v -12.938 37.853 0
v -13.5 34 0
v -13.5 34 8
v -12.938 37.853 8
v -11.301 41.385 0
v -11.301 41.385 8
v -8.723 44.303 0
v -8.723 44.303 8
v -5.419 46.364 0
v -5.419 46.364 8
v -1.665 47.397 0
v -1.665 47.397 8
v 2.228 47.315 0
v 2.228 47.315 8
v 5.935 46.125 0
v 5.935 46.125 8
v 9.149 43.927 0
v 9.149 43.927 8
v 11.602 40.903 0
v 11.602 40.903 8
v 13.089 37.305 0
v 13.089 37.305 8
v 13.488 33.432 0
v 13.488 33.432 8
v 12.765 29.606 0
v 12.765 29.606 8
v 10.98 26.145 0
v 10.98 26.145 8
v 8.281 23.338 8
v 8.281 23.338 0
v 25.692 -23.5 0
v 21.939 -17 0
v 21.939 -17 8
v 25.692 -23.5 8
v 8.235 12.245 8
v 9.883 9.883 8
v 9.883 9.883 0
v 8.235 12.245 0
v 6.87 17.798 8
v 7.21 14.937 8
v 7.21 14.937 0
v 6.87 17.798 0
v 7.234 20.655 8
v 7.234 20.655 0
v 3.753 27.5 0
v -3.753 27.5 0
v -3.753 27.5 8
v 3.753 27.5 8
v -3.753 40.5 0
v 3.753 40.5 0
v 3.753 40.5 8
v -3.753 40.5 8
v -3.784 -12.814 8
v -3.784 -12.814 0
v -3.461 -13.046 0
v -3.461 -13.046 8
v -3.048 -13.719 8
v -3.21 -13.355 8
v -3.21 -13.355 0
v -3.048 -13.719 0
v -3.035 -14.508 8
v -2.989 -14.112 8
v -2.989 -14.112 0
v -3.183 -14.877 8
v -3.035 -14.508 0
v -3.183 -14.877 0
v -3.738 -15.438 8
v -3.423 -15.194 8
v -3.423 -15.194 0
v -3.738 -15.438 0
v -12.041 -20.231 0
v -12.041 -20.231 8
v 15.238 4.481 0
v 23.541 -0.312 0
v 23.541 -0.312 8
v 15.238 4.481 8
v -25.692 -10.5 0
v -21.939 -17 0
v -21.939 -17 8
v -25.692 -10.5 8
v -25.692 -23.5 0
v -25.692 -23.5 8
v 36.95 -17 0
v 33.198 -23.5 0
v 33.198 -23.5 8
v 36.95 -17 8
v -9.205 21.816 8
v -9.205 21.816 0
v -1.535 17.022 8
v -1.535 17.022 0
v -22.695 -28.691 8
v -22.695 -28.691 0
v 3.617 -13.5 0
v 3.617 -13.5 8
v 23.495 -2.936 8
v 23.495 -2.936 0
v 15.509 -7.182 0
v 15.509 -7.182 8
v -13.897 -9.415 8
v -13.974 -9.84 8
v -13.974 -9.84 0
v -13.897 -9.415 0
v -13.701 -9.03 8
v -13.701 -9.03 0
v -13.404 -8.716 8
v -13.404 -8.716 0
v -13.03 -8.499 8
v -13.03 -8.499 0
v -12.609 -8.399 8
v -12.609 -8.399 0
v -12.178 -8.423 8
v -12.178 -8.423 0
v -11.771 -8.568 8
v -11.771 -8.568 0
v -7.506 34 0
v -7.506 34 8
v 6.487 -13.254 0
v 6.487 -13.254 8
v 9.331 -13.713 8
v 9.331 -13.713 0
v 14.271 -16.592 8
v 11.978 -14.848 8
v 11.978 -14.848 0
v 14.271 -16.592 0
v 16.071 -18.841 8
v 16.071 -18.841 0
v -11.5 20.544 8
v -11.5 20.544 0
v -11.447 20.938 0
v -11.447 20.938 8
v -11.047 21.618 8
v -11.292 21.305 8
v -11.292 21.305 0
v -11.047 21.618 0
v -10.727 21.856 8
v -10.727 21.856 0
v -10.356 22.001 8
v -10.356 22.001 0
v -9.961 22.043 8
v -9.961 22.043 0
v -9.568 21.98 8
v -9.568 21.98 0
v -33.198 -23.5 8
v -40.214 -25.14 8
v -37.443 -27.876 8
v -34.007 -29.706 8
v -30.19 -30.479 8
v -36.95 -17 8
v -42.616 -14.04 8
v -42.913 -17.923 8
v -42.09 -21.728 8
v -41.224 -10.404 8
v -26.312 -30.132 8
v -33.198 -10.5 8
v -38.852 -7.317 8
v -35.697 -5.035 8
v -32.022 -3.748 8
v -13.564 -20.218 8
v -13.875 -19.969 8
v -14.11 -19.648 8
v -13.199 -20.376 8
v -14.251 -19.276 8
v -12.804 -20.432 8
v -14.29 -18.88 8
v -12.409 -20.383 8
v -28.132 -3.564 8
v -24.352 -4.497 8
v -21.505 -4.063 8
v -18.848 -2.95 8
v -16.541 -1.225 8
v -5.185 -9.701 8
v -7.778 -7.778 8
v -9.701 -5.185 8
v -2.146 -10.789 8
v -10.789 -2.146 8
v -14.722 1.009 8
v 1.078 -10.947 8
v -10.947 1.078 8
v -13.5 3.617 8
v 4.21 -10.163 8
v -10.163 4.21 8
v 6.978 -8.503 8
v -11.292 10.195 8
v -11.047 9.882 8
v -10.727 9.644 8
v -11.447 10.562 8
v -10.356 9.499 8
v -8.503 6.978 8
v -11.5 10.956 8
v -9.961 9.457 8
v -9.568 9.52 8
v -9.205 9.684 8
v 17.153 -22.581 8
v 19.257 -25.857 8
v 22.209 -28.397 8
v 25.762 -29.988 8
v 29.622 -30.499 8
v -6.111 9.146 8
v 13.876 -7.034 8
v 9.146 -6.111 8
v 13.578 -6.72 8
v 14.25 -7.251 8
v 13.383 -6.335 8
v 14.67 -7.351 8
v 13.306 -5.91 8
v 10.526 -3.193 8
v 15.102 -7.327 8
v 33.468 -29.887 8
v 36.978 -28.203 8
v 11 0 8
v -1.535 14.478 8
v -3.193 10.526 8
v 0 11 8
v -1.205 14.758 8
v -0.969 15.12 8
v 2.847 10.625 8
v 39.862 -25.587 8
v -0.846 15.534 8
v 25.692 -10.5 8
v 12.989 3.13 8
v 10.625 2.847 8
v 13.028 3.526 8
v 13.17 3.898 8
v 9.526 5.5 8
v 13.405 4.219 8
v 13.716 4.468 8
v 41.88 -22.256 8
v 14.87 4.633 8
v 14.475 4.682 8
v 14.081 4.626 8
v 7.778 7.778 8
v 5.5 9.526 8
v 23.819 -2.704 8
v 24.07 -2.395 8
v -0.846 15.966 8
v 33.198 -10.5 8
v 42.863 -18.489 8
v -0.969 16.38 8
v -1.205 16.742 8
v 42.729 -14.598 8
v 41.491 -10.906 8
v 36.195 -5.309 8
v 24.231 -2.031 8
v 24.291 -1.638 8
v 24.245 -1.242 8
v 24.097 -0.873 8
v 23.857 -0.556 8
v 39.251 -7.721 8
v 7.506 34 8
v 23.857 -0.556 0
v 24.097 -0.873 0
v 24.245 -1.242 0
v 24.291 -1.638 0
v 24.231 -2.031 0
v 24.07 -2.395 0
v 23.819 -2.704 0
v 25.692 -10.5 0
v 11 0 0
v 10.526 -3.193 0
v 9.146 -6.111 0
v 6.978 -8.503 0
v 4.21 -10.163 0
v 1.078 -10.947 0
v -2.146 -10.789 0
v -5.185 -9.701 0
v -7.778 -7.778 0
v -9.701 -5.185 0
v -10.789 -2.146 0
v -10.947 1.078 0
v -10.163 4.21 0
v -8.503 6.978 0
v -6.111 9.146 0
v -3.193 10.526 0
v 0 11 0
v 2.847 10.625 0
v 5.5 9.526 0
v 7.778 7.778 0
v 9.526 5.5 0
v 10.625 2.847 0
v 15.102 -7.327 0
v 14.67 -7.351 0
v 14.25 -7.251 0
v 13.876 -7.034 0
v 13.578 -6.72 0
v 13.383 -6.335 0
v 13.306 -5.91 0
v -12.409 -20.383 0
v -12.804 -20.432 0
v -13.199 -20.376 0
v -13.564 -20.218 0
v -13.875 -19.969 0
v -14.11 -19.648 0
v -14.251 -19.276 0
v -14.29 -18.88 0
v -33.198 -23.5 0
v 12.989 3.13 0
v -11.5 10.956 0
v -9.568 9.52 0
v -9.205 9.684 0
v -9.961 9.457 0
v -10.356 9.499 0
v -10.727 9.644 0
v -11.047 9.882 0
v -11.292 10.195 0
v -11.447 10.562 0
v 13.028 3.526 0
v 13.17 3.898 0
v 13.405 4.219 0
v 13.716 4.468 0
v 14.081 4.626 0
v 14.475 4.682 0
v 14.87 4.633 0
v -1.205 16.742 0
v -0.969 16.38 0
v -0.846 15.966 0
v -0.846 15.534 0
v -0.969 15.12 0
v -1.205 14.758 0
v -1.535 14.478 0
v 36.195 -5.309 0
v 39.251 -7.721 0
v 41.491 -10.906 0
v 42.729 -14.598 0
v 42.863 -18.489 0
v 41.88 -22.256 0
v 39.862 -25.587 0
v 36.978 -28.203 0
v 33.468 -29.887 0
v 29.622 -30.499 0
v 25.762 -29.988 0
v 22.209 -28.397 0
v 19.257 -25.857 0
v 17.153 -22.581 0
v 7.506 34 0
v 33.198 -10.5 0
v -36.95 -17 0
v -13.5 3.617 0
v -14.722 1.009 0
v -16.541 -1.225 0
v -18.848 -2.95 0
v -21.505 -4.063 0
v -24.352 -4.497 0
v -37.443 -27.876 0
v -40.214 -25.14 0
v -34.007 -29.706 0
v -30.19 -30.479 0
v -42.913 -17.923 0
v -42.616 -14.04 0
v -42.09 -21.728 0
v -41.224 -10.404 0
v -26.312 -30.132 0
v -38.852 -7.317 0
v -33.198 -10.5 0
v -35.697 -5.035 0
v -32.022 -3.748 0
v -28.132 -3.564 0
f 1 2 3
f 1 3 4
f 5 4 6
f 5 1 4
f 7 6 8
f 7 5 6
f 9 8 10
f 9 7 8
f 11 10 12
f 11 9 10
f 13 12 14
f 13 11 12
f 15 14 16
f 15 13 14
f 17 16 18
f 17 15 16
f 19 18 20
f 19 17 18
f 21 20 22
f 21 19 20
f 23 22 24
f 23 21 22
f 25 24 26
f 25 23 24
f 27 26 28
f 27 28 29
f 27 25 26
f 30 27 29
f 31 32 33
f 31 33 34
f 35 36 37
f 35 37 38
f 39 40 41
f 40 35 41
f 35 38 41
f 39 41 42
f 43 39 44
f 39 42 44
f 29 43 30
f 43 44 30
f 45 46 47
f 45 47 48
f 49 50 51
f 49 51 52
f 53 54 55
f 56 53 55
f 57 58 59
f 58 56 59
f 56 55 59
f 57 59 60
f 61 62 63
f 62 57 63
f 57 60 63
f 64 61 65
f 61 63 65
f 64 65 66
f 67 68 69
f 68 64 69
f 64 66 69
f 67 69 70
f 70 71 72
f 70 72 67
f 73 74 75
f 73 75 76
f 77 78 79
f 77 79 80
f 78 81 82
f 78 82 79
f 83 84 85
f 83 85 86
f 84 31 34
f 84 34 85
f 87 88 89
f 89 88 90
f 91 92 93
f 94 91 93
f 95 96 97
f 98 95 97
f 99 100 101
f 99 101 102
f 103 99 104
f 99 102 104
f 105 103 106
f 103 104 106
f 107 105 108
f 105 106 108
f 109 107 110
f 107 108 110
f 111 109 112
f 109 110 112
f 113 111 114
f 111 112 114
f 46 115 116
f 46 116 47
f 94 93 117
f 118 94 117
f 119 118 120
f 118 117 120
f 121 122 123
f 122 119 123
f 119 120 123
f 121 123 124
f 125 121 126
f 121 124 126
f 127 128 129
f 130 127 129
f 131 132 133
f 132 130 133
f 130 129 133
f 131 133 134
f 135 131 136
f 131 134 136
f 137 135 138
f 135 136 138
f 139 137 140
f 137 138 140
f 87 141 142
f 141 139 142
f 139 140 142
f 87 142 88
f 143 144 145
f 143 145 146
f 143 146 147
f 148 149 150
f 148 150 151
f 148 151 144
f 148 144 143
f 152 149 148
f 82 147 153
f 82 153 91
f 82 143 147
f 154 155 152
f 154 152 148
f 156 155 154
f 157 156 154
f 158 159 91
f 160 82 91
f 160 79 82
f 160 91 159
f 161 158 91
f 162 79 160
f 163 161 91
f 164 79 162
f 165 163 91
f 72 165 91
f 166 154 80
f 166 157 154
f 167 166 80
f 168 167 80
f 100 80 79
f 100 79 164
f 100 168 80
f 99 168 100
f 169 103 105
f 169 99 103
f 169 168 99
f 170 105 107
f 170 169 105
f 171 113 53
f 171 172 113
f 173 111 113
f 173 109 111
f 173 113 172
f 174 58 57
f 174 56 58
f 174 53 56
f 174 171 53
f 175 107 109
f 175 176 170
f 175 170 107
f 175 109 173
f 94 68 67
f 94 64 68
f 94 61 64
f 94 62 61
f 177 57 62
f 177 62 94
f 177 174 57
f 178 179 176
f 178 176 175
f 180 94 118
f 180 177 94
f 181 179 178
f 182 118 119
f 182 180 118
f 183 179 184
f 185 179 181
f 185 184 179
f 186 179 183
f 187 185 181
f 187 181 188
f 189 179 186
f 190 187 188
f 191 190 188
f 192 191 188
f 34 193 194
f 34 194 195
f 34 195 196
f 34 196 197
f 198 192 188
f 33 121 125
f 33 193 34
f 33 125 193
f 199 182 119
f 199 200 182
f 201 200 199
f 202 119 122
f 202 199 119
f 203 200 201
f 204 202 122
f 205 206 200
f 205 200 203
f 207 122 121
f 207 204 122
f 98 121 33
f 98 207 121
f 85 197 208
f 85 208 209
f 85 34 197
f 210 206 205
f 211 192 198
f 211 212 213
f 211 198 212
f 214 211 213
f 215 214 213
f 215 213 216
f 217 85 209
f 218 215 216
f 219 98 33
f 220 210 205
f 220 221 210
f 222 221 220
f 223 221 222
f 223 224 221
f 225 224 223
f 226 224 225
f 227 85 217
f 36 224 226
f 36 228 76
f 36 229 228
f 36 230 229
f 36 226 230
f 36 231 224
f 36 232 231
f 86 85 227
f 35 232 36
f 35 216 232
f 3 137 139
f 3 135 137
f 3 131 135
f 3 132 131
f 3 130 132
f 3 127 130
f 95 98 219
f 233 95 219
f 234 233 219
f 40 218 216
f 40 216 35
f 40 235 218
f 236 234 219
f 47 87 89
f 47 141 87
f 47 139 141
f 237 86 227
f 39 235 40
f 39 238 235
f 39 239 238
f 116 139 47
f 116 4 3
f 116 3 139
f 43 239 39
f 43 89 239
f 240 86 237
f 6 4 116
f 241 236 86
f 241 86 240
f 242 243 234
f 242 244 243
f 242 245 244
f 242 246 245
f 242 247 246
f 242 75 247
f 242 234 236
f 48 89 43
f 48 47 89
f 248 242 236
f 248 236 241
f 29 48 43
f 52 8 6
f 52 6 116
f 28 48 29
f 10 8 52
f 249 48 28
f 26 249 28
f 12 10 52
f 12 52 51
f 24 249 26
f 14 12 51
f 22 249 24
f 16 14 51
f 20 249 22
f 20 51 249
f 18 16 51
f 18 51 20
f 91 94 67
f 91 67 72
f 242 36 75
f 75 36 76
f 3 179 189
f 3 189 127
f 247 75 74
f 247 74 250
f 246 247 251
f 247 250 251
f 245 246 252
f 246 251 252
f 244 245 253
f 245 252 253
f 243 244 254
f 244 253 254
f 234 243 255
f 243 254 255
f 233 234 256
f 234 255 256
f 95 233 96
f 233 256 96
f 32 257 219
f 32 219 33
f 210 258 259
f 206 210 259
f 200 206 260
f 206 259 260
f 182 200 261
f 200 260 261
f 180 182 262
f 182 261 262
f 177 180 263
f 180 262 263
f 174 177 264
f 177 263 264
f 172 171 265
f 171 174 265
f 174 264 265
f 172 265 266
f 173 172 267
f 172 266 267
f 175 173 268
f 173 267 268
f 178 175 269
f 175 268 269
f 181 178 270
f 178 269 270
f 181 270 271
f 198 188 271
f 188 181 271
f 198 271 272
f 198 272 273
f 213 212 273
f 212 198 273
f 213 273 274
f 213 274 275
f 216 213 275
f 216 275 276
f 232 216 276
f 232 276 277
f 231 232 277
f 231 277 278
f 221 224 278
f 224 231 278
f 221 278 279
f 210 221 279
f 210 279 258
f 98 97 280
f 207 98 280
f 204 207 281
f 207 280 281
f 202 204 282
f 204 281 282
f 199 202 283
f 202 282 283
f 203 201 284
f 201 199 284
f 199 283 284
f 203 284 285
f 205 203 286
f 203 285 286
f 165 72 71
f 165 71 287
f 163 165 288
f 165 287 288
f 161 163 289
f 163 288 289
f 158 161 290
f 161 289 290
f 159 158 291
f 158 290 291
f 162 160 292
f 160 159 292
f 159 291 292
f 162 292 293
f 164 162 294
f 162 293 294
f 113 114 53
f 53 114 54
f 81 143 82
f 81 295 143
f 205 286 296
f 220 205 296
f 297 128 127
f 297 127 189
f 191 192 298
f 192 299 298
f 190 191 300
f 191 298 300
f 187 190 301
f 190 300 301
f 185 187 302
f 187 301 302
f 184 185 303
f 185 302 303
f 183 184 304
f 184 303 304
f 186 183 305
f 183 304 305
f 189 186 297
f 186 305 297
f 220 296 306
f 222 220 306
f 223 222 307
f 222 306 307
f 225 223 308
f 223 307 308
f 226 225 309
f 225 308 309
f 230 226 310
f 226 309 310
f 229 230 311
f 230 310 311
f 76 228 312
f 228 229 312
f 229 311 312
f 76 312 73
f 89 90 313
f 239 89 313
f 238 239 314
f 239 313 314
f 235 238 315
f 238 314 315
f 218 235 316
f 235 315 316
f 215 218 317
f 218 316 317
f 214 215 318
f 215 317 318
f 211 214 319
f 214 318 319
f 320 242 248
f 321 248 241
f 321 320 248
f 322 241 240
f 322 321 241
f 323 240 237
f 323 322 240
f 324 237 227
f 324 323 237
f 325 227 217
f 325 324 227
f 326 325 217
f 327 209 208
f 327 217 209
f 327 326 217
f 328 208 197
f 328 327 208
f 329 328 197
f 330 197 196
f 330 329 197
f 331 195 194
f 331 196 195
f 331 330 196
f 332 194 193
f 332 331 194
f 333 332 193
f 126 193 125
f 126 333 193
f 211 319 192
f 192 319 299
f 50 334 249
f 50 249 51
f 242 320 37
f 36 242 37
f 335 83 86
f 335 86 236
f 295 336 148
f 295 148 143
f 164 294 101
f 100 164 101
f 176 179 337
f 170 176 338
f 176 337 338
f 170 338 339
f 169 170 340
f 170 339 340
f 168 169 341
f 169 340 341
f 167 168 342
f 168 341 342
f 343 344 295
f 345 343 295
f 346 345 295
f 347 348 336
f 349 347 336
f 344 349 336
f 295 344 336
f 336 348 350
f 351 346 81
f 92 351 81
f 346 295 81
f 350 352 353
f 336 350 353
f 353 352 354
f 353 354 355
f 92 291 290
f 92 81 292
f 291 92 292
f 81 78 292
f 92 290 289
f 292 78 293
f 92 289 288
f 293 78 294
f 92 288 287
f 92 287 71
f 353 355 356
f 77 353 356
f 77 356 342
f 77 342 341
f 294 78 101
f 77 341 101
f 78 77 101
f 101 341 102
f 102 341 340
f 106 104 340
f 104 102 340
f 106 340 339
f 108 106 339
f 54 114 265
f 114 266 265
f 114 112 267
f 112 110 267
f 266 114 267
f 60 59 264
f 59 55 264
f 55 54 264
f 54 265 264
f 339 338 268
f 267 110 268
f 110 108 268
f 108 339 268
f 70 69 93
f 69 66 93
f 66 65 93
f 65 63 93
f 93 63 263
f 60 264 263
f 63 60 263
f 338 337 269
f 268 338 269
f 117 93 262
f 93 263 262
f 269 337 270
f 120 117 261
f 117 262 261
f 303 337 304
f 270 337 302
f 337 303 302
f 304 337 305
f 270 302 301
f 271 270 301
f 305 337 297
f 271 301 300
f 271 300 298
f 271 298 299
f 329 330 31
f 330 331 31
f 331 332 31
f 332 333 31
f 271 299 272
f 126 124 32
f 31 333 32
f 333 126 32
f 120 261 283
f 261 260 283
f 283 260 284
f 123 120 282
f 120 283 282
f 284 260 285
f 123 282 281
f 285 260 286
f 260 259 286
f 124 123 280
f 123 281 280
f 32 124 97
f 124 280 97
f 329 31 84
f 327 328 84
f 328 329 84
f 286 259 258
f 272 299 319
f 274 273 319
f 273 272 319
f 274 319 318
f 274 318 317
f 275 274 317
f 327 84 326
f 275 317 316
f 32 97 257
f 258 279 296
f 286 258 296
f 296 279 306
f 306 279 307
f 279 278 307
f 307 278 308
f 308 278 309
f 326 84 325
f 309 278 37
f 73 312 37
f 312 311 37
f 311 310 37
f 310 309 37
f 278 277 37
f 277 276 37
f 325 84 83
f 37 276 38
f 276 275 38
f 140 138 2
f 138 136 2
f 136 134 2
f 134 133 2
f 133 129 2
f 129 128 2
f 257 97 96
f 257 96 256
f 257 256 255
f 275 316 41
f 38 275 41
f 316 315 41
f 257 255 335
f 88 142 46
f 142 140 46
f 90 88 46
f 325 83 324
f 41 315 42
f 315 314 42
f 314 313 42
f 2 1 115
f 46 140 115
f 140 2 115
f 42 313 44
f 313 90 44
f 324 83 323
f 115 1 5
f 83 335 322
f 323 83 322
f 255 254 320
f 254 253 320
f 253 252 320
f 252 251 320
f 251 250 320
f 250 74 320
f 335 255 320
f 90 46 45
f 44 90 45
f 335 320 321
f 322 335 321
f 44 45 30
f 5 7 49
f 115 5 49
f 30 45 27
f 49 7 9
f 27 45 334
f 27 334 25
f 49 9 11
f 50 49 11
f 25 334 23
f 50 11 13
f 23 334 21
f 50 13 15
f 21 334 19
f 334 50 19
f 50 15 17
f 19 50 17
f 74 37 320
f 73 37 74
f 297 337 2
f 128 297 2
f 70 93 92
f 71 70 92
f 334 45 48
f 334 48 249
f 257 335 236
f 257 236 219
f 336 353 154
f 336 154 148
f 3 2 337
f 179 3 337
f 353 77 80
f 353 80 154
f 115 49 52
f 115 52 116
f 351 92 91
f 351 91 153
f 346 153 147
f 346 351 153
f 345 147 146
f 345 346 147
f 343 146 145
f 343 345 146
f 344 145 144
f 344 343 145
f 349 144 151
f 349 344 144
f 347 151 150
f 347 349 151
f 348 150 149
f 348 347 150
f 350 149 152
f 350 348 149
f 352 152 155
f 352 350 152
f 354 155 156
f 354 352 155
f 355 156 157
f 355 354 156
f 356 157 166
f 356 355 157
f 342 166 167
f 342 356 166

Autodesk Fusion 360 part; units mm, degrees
sketch "Sketch1" plane through (0, 0, 0) normal (0, 0, 1) x (1, 0, 0)
  circle A0 centre (0, 0) radius 4
  circle A1 centre (0, 0) radius 11
  line L0 (3.7528, 27.5) -> (7.5056, 34)
  line L1 (7.5056, 34) -> (3.7528, 40.5)
  line L2 (3.7528, 40.5) -> (-3.7528, 40.5)
  line L3 (-3.7528, 40.5) -> (-7.5056, 34)
  line L4 (-7.5056, 34) -> (-3.7528, 27.5)
  line L5 (-3.7528, 27.5) -> (3.7528, 27.5)
  line L6 (0, 0) -> (0, -80) construction
  circle A2 centre (0, 0) radius 48 construction
  circle A3 centre (0, 34) radius 13.5
  line L7 (-13.5, 34) -> (-13.5, 3.6173)
  arc A4 (8.2813, 23.3384) -> (9.8827, 9.8827) centre (18.6421, 17.7483) ccw
  line L8 (-22.6949, -28.6913) -> (3.6173, -13.5)
  circle A5 centre (-29.4449, -17) radius 13.5
  line L9 (-36.9504, -17) -> (-33.1976, -23.5)
  line L10 (-33.1976, -23.5) -> (-25.6921, -23.5)
  line L11 (-25.6921, -23.5) -> (-21.9393, -17)
  line L12 (-21.9393, -17) -> (-25.6921, -10.5)
  line L13 (-33.1976, -10.5) -> (-36.9504, -17)
  line L14 (-25.6921, -10.5) -> (-33.1976, -10.5)
  arc A6 (-24.3523, -4.4974) -> (-13.5, 3.6173) centre (-24.6915, 7.2704) ccw
  line L15 (36.1949, -5.3087) -> (9.8827, 9.8827)
  circle A7 centre (29.4449, -17) radius 13.5
  line L16 (33.1976, -23.5) -> (36.9504, -17)
  line L17 (36.9504, -17) -> (33.1976, -10.5)
  line L18 (33.1976, -10.5) -> (25.6921, -10.5)
  line L19 (25.6921, -10.5) -> (21.9393, -17)
  line L20 (25.6921, -23.5) -> (33.1976, -23.5)
  line L21 (21.9393, -17) -> (25.6921, -23.5)
  arc A8 (16.071, -18.841) -> (3.6173, -13.5) centre (6.0494, -25.0187) ccw
  line L22 (0, 11) -> (0, 20.5)
  line L23 (-11.5, 15.75) -> (-11.5, 20.5436)
  line L24 (-11.5, 15.75) -> (-11.5, 10.9564)
  line L25 (-9.205, 21.8156) -> (-1.5352, 17.022)
  line L26 (-1.5352, 14.478) -> (-9.205, 9.6844)
  arc A9 (-9.205, 21.8156) -> (-11.5, 20.5436) centre (-10, 20.5436) ccw
  arc A10 (-1.5352, 14.478) -> (-1.5352, 17.022) centre (-2.3302, 15.75) ccw
  arc A11 (-11.5, 10.9564) -> (-9.205, 9.6844) centre (-10, 10.9564) ccw
  arc A12 (-3.7385, -15.4375) -> (-3.7844, -12.814) centre (-4.4885, -14.1384) ccw
  line L27 (-7.8899, -17.8343) -> (-3.7385, -15.4375)
  line L28 (-7.8899, -17.8343) -> (-12.0413, -20.2311)
  arc A13 (-14.2904, -18.8796) -> (-12.0413, -20.2311) centre (-12.7913, -18.9321) ccw
  line L29 (-14.2904, -18.8796) -> (-13.9739, -9.8405)
  arc A14 (-11.7707, -8.5685) -> (-13.9739, -9.8405) centre (-12.4748, -9.893) ccw
  line L30 (-11.7707, -8.5685) -> (-3.7844, -12.814)
  arc A15 (15.2385, 4.4811) -> (12.9894, 3.1296) centre (14.4885, 3.1821) ccw
  line L31 (19.3899, 2.0843) -> (15.2385, 4.4811)
  line L32 (19.3899, 2.0843) -> (23.5413, -0.3125)
  arc A16 (23.4954, -2.936) -> (23.5413, -0.3125) centre (22.7913, -1.6116) ccw
  line L33 (23.4954, -2.936) -> (15.5091, -7.1815)
  arc A17 (13.3059, -5.9095) -> (15.5091, -7.1815) centre (14.805, -5.857) ccw
  line L34 (13.3059, -5.9095) -> (12.9894, 3.1296)
  point P0 (0, 36)
  point P1 (-11.5, 23.25)
  point P2 (-11.5, 8.25)
  point P3 (0.5, 15.75)
  dimension "d25" = 13.5
  dimension "d46" = 22
  dimension "d47" = 96
  dimension "d51" = 12
  dimension "d52" = 1.5
  dimension "d53" = 1.5
  dimension "d54" = 1.5
  dimension "d56" = 360
extrude "Extrude1" add sketch "Sketch1" along normal blind 8 contours A3 L7 A4 L8 A5 A6 L15 A7 A8 | A3 | A5 | A7 makes body 1
copy_body "Body->Comp1" bodies 1 removing the originals makes body 2 in component "Component"
component "Component" placed x (1, 0, 0) y (0, 1, 0) z (0, 0, 1) at (0, 0, 0)
